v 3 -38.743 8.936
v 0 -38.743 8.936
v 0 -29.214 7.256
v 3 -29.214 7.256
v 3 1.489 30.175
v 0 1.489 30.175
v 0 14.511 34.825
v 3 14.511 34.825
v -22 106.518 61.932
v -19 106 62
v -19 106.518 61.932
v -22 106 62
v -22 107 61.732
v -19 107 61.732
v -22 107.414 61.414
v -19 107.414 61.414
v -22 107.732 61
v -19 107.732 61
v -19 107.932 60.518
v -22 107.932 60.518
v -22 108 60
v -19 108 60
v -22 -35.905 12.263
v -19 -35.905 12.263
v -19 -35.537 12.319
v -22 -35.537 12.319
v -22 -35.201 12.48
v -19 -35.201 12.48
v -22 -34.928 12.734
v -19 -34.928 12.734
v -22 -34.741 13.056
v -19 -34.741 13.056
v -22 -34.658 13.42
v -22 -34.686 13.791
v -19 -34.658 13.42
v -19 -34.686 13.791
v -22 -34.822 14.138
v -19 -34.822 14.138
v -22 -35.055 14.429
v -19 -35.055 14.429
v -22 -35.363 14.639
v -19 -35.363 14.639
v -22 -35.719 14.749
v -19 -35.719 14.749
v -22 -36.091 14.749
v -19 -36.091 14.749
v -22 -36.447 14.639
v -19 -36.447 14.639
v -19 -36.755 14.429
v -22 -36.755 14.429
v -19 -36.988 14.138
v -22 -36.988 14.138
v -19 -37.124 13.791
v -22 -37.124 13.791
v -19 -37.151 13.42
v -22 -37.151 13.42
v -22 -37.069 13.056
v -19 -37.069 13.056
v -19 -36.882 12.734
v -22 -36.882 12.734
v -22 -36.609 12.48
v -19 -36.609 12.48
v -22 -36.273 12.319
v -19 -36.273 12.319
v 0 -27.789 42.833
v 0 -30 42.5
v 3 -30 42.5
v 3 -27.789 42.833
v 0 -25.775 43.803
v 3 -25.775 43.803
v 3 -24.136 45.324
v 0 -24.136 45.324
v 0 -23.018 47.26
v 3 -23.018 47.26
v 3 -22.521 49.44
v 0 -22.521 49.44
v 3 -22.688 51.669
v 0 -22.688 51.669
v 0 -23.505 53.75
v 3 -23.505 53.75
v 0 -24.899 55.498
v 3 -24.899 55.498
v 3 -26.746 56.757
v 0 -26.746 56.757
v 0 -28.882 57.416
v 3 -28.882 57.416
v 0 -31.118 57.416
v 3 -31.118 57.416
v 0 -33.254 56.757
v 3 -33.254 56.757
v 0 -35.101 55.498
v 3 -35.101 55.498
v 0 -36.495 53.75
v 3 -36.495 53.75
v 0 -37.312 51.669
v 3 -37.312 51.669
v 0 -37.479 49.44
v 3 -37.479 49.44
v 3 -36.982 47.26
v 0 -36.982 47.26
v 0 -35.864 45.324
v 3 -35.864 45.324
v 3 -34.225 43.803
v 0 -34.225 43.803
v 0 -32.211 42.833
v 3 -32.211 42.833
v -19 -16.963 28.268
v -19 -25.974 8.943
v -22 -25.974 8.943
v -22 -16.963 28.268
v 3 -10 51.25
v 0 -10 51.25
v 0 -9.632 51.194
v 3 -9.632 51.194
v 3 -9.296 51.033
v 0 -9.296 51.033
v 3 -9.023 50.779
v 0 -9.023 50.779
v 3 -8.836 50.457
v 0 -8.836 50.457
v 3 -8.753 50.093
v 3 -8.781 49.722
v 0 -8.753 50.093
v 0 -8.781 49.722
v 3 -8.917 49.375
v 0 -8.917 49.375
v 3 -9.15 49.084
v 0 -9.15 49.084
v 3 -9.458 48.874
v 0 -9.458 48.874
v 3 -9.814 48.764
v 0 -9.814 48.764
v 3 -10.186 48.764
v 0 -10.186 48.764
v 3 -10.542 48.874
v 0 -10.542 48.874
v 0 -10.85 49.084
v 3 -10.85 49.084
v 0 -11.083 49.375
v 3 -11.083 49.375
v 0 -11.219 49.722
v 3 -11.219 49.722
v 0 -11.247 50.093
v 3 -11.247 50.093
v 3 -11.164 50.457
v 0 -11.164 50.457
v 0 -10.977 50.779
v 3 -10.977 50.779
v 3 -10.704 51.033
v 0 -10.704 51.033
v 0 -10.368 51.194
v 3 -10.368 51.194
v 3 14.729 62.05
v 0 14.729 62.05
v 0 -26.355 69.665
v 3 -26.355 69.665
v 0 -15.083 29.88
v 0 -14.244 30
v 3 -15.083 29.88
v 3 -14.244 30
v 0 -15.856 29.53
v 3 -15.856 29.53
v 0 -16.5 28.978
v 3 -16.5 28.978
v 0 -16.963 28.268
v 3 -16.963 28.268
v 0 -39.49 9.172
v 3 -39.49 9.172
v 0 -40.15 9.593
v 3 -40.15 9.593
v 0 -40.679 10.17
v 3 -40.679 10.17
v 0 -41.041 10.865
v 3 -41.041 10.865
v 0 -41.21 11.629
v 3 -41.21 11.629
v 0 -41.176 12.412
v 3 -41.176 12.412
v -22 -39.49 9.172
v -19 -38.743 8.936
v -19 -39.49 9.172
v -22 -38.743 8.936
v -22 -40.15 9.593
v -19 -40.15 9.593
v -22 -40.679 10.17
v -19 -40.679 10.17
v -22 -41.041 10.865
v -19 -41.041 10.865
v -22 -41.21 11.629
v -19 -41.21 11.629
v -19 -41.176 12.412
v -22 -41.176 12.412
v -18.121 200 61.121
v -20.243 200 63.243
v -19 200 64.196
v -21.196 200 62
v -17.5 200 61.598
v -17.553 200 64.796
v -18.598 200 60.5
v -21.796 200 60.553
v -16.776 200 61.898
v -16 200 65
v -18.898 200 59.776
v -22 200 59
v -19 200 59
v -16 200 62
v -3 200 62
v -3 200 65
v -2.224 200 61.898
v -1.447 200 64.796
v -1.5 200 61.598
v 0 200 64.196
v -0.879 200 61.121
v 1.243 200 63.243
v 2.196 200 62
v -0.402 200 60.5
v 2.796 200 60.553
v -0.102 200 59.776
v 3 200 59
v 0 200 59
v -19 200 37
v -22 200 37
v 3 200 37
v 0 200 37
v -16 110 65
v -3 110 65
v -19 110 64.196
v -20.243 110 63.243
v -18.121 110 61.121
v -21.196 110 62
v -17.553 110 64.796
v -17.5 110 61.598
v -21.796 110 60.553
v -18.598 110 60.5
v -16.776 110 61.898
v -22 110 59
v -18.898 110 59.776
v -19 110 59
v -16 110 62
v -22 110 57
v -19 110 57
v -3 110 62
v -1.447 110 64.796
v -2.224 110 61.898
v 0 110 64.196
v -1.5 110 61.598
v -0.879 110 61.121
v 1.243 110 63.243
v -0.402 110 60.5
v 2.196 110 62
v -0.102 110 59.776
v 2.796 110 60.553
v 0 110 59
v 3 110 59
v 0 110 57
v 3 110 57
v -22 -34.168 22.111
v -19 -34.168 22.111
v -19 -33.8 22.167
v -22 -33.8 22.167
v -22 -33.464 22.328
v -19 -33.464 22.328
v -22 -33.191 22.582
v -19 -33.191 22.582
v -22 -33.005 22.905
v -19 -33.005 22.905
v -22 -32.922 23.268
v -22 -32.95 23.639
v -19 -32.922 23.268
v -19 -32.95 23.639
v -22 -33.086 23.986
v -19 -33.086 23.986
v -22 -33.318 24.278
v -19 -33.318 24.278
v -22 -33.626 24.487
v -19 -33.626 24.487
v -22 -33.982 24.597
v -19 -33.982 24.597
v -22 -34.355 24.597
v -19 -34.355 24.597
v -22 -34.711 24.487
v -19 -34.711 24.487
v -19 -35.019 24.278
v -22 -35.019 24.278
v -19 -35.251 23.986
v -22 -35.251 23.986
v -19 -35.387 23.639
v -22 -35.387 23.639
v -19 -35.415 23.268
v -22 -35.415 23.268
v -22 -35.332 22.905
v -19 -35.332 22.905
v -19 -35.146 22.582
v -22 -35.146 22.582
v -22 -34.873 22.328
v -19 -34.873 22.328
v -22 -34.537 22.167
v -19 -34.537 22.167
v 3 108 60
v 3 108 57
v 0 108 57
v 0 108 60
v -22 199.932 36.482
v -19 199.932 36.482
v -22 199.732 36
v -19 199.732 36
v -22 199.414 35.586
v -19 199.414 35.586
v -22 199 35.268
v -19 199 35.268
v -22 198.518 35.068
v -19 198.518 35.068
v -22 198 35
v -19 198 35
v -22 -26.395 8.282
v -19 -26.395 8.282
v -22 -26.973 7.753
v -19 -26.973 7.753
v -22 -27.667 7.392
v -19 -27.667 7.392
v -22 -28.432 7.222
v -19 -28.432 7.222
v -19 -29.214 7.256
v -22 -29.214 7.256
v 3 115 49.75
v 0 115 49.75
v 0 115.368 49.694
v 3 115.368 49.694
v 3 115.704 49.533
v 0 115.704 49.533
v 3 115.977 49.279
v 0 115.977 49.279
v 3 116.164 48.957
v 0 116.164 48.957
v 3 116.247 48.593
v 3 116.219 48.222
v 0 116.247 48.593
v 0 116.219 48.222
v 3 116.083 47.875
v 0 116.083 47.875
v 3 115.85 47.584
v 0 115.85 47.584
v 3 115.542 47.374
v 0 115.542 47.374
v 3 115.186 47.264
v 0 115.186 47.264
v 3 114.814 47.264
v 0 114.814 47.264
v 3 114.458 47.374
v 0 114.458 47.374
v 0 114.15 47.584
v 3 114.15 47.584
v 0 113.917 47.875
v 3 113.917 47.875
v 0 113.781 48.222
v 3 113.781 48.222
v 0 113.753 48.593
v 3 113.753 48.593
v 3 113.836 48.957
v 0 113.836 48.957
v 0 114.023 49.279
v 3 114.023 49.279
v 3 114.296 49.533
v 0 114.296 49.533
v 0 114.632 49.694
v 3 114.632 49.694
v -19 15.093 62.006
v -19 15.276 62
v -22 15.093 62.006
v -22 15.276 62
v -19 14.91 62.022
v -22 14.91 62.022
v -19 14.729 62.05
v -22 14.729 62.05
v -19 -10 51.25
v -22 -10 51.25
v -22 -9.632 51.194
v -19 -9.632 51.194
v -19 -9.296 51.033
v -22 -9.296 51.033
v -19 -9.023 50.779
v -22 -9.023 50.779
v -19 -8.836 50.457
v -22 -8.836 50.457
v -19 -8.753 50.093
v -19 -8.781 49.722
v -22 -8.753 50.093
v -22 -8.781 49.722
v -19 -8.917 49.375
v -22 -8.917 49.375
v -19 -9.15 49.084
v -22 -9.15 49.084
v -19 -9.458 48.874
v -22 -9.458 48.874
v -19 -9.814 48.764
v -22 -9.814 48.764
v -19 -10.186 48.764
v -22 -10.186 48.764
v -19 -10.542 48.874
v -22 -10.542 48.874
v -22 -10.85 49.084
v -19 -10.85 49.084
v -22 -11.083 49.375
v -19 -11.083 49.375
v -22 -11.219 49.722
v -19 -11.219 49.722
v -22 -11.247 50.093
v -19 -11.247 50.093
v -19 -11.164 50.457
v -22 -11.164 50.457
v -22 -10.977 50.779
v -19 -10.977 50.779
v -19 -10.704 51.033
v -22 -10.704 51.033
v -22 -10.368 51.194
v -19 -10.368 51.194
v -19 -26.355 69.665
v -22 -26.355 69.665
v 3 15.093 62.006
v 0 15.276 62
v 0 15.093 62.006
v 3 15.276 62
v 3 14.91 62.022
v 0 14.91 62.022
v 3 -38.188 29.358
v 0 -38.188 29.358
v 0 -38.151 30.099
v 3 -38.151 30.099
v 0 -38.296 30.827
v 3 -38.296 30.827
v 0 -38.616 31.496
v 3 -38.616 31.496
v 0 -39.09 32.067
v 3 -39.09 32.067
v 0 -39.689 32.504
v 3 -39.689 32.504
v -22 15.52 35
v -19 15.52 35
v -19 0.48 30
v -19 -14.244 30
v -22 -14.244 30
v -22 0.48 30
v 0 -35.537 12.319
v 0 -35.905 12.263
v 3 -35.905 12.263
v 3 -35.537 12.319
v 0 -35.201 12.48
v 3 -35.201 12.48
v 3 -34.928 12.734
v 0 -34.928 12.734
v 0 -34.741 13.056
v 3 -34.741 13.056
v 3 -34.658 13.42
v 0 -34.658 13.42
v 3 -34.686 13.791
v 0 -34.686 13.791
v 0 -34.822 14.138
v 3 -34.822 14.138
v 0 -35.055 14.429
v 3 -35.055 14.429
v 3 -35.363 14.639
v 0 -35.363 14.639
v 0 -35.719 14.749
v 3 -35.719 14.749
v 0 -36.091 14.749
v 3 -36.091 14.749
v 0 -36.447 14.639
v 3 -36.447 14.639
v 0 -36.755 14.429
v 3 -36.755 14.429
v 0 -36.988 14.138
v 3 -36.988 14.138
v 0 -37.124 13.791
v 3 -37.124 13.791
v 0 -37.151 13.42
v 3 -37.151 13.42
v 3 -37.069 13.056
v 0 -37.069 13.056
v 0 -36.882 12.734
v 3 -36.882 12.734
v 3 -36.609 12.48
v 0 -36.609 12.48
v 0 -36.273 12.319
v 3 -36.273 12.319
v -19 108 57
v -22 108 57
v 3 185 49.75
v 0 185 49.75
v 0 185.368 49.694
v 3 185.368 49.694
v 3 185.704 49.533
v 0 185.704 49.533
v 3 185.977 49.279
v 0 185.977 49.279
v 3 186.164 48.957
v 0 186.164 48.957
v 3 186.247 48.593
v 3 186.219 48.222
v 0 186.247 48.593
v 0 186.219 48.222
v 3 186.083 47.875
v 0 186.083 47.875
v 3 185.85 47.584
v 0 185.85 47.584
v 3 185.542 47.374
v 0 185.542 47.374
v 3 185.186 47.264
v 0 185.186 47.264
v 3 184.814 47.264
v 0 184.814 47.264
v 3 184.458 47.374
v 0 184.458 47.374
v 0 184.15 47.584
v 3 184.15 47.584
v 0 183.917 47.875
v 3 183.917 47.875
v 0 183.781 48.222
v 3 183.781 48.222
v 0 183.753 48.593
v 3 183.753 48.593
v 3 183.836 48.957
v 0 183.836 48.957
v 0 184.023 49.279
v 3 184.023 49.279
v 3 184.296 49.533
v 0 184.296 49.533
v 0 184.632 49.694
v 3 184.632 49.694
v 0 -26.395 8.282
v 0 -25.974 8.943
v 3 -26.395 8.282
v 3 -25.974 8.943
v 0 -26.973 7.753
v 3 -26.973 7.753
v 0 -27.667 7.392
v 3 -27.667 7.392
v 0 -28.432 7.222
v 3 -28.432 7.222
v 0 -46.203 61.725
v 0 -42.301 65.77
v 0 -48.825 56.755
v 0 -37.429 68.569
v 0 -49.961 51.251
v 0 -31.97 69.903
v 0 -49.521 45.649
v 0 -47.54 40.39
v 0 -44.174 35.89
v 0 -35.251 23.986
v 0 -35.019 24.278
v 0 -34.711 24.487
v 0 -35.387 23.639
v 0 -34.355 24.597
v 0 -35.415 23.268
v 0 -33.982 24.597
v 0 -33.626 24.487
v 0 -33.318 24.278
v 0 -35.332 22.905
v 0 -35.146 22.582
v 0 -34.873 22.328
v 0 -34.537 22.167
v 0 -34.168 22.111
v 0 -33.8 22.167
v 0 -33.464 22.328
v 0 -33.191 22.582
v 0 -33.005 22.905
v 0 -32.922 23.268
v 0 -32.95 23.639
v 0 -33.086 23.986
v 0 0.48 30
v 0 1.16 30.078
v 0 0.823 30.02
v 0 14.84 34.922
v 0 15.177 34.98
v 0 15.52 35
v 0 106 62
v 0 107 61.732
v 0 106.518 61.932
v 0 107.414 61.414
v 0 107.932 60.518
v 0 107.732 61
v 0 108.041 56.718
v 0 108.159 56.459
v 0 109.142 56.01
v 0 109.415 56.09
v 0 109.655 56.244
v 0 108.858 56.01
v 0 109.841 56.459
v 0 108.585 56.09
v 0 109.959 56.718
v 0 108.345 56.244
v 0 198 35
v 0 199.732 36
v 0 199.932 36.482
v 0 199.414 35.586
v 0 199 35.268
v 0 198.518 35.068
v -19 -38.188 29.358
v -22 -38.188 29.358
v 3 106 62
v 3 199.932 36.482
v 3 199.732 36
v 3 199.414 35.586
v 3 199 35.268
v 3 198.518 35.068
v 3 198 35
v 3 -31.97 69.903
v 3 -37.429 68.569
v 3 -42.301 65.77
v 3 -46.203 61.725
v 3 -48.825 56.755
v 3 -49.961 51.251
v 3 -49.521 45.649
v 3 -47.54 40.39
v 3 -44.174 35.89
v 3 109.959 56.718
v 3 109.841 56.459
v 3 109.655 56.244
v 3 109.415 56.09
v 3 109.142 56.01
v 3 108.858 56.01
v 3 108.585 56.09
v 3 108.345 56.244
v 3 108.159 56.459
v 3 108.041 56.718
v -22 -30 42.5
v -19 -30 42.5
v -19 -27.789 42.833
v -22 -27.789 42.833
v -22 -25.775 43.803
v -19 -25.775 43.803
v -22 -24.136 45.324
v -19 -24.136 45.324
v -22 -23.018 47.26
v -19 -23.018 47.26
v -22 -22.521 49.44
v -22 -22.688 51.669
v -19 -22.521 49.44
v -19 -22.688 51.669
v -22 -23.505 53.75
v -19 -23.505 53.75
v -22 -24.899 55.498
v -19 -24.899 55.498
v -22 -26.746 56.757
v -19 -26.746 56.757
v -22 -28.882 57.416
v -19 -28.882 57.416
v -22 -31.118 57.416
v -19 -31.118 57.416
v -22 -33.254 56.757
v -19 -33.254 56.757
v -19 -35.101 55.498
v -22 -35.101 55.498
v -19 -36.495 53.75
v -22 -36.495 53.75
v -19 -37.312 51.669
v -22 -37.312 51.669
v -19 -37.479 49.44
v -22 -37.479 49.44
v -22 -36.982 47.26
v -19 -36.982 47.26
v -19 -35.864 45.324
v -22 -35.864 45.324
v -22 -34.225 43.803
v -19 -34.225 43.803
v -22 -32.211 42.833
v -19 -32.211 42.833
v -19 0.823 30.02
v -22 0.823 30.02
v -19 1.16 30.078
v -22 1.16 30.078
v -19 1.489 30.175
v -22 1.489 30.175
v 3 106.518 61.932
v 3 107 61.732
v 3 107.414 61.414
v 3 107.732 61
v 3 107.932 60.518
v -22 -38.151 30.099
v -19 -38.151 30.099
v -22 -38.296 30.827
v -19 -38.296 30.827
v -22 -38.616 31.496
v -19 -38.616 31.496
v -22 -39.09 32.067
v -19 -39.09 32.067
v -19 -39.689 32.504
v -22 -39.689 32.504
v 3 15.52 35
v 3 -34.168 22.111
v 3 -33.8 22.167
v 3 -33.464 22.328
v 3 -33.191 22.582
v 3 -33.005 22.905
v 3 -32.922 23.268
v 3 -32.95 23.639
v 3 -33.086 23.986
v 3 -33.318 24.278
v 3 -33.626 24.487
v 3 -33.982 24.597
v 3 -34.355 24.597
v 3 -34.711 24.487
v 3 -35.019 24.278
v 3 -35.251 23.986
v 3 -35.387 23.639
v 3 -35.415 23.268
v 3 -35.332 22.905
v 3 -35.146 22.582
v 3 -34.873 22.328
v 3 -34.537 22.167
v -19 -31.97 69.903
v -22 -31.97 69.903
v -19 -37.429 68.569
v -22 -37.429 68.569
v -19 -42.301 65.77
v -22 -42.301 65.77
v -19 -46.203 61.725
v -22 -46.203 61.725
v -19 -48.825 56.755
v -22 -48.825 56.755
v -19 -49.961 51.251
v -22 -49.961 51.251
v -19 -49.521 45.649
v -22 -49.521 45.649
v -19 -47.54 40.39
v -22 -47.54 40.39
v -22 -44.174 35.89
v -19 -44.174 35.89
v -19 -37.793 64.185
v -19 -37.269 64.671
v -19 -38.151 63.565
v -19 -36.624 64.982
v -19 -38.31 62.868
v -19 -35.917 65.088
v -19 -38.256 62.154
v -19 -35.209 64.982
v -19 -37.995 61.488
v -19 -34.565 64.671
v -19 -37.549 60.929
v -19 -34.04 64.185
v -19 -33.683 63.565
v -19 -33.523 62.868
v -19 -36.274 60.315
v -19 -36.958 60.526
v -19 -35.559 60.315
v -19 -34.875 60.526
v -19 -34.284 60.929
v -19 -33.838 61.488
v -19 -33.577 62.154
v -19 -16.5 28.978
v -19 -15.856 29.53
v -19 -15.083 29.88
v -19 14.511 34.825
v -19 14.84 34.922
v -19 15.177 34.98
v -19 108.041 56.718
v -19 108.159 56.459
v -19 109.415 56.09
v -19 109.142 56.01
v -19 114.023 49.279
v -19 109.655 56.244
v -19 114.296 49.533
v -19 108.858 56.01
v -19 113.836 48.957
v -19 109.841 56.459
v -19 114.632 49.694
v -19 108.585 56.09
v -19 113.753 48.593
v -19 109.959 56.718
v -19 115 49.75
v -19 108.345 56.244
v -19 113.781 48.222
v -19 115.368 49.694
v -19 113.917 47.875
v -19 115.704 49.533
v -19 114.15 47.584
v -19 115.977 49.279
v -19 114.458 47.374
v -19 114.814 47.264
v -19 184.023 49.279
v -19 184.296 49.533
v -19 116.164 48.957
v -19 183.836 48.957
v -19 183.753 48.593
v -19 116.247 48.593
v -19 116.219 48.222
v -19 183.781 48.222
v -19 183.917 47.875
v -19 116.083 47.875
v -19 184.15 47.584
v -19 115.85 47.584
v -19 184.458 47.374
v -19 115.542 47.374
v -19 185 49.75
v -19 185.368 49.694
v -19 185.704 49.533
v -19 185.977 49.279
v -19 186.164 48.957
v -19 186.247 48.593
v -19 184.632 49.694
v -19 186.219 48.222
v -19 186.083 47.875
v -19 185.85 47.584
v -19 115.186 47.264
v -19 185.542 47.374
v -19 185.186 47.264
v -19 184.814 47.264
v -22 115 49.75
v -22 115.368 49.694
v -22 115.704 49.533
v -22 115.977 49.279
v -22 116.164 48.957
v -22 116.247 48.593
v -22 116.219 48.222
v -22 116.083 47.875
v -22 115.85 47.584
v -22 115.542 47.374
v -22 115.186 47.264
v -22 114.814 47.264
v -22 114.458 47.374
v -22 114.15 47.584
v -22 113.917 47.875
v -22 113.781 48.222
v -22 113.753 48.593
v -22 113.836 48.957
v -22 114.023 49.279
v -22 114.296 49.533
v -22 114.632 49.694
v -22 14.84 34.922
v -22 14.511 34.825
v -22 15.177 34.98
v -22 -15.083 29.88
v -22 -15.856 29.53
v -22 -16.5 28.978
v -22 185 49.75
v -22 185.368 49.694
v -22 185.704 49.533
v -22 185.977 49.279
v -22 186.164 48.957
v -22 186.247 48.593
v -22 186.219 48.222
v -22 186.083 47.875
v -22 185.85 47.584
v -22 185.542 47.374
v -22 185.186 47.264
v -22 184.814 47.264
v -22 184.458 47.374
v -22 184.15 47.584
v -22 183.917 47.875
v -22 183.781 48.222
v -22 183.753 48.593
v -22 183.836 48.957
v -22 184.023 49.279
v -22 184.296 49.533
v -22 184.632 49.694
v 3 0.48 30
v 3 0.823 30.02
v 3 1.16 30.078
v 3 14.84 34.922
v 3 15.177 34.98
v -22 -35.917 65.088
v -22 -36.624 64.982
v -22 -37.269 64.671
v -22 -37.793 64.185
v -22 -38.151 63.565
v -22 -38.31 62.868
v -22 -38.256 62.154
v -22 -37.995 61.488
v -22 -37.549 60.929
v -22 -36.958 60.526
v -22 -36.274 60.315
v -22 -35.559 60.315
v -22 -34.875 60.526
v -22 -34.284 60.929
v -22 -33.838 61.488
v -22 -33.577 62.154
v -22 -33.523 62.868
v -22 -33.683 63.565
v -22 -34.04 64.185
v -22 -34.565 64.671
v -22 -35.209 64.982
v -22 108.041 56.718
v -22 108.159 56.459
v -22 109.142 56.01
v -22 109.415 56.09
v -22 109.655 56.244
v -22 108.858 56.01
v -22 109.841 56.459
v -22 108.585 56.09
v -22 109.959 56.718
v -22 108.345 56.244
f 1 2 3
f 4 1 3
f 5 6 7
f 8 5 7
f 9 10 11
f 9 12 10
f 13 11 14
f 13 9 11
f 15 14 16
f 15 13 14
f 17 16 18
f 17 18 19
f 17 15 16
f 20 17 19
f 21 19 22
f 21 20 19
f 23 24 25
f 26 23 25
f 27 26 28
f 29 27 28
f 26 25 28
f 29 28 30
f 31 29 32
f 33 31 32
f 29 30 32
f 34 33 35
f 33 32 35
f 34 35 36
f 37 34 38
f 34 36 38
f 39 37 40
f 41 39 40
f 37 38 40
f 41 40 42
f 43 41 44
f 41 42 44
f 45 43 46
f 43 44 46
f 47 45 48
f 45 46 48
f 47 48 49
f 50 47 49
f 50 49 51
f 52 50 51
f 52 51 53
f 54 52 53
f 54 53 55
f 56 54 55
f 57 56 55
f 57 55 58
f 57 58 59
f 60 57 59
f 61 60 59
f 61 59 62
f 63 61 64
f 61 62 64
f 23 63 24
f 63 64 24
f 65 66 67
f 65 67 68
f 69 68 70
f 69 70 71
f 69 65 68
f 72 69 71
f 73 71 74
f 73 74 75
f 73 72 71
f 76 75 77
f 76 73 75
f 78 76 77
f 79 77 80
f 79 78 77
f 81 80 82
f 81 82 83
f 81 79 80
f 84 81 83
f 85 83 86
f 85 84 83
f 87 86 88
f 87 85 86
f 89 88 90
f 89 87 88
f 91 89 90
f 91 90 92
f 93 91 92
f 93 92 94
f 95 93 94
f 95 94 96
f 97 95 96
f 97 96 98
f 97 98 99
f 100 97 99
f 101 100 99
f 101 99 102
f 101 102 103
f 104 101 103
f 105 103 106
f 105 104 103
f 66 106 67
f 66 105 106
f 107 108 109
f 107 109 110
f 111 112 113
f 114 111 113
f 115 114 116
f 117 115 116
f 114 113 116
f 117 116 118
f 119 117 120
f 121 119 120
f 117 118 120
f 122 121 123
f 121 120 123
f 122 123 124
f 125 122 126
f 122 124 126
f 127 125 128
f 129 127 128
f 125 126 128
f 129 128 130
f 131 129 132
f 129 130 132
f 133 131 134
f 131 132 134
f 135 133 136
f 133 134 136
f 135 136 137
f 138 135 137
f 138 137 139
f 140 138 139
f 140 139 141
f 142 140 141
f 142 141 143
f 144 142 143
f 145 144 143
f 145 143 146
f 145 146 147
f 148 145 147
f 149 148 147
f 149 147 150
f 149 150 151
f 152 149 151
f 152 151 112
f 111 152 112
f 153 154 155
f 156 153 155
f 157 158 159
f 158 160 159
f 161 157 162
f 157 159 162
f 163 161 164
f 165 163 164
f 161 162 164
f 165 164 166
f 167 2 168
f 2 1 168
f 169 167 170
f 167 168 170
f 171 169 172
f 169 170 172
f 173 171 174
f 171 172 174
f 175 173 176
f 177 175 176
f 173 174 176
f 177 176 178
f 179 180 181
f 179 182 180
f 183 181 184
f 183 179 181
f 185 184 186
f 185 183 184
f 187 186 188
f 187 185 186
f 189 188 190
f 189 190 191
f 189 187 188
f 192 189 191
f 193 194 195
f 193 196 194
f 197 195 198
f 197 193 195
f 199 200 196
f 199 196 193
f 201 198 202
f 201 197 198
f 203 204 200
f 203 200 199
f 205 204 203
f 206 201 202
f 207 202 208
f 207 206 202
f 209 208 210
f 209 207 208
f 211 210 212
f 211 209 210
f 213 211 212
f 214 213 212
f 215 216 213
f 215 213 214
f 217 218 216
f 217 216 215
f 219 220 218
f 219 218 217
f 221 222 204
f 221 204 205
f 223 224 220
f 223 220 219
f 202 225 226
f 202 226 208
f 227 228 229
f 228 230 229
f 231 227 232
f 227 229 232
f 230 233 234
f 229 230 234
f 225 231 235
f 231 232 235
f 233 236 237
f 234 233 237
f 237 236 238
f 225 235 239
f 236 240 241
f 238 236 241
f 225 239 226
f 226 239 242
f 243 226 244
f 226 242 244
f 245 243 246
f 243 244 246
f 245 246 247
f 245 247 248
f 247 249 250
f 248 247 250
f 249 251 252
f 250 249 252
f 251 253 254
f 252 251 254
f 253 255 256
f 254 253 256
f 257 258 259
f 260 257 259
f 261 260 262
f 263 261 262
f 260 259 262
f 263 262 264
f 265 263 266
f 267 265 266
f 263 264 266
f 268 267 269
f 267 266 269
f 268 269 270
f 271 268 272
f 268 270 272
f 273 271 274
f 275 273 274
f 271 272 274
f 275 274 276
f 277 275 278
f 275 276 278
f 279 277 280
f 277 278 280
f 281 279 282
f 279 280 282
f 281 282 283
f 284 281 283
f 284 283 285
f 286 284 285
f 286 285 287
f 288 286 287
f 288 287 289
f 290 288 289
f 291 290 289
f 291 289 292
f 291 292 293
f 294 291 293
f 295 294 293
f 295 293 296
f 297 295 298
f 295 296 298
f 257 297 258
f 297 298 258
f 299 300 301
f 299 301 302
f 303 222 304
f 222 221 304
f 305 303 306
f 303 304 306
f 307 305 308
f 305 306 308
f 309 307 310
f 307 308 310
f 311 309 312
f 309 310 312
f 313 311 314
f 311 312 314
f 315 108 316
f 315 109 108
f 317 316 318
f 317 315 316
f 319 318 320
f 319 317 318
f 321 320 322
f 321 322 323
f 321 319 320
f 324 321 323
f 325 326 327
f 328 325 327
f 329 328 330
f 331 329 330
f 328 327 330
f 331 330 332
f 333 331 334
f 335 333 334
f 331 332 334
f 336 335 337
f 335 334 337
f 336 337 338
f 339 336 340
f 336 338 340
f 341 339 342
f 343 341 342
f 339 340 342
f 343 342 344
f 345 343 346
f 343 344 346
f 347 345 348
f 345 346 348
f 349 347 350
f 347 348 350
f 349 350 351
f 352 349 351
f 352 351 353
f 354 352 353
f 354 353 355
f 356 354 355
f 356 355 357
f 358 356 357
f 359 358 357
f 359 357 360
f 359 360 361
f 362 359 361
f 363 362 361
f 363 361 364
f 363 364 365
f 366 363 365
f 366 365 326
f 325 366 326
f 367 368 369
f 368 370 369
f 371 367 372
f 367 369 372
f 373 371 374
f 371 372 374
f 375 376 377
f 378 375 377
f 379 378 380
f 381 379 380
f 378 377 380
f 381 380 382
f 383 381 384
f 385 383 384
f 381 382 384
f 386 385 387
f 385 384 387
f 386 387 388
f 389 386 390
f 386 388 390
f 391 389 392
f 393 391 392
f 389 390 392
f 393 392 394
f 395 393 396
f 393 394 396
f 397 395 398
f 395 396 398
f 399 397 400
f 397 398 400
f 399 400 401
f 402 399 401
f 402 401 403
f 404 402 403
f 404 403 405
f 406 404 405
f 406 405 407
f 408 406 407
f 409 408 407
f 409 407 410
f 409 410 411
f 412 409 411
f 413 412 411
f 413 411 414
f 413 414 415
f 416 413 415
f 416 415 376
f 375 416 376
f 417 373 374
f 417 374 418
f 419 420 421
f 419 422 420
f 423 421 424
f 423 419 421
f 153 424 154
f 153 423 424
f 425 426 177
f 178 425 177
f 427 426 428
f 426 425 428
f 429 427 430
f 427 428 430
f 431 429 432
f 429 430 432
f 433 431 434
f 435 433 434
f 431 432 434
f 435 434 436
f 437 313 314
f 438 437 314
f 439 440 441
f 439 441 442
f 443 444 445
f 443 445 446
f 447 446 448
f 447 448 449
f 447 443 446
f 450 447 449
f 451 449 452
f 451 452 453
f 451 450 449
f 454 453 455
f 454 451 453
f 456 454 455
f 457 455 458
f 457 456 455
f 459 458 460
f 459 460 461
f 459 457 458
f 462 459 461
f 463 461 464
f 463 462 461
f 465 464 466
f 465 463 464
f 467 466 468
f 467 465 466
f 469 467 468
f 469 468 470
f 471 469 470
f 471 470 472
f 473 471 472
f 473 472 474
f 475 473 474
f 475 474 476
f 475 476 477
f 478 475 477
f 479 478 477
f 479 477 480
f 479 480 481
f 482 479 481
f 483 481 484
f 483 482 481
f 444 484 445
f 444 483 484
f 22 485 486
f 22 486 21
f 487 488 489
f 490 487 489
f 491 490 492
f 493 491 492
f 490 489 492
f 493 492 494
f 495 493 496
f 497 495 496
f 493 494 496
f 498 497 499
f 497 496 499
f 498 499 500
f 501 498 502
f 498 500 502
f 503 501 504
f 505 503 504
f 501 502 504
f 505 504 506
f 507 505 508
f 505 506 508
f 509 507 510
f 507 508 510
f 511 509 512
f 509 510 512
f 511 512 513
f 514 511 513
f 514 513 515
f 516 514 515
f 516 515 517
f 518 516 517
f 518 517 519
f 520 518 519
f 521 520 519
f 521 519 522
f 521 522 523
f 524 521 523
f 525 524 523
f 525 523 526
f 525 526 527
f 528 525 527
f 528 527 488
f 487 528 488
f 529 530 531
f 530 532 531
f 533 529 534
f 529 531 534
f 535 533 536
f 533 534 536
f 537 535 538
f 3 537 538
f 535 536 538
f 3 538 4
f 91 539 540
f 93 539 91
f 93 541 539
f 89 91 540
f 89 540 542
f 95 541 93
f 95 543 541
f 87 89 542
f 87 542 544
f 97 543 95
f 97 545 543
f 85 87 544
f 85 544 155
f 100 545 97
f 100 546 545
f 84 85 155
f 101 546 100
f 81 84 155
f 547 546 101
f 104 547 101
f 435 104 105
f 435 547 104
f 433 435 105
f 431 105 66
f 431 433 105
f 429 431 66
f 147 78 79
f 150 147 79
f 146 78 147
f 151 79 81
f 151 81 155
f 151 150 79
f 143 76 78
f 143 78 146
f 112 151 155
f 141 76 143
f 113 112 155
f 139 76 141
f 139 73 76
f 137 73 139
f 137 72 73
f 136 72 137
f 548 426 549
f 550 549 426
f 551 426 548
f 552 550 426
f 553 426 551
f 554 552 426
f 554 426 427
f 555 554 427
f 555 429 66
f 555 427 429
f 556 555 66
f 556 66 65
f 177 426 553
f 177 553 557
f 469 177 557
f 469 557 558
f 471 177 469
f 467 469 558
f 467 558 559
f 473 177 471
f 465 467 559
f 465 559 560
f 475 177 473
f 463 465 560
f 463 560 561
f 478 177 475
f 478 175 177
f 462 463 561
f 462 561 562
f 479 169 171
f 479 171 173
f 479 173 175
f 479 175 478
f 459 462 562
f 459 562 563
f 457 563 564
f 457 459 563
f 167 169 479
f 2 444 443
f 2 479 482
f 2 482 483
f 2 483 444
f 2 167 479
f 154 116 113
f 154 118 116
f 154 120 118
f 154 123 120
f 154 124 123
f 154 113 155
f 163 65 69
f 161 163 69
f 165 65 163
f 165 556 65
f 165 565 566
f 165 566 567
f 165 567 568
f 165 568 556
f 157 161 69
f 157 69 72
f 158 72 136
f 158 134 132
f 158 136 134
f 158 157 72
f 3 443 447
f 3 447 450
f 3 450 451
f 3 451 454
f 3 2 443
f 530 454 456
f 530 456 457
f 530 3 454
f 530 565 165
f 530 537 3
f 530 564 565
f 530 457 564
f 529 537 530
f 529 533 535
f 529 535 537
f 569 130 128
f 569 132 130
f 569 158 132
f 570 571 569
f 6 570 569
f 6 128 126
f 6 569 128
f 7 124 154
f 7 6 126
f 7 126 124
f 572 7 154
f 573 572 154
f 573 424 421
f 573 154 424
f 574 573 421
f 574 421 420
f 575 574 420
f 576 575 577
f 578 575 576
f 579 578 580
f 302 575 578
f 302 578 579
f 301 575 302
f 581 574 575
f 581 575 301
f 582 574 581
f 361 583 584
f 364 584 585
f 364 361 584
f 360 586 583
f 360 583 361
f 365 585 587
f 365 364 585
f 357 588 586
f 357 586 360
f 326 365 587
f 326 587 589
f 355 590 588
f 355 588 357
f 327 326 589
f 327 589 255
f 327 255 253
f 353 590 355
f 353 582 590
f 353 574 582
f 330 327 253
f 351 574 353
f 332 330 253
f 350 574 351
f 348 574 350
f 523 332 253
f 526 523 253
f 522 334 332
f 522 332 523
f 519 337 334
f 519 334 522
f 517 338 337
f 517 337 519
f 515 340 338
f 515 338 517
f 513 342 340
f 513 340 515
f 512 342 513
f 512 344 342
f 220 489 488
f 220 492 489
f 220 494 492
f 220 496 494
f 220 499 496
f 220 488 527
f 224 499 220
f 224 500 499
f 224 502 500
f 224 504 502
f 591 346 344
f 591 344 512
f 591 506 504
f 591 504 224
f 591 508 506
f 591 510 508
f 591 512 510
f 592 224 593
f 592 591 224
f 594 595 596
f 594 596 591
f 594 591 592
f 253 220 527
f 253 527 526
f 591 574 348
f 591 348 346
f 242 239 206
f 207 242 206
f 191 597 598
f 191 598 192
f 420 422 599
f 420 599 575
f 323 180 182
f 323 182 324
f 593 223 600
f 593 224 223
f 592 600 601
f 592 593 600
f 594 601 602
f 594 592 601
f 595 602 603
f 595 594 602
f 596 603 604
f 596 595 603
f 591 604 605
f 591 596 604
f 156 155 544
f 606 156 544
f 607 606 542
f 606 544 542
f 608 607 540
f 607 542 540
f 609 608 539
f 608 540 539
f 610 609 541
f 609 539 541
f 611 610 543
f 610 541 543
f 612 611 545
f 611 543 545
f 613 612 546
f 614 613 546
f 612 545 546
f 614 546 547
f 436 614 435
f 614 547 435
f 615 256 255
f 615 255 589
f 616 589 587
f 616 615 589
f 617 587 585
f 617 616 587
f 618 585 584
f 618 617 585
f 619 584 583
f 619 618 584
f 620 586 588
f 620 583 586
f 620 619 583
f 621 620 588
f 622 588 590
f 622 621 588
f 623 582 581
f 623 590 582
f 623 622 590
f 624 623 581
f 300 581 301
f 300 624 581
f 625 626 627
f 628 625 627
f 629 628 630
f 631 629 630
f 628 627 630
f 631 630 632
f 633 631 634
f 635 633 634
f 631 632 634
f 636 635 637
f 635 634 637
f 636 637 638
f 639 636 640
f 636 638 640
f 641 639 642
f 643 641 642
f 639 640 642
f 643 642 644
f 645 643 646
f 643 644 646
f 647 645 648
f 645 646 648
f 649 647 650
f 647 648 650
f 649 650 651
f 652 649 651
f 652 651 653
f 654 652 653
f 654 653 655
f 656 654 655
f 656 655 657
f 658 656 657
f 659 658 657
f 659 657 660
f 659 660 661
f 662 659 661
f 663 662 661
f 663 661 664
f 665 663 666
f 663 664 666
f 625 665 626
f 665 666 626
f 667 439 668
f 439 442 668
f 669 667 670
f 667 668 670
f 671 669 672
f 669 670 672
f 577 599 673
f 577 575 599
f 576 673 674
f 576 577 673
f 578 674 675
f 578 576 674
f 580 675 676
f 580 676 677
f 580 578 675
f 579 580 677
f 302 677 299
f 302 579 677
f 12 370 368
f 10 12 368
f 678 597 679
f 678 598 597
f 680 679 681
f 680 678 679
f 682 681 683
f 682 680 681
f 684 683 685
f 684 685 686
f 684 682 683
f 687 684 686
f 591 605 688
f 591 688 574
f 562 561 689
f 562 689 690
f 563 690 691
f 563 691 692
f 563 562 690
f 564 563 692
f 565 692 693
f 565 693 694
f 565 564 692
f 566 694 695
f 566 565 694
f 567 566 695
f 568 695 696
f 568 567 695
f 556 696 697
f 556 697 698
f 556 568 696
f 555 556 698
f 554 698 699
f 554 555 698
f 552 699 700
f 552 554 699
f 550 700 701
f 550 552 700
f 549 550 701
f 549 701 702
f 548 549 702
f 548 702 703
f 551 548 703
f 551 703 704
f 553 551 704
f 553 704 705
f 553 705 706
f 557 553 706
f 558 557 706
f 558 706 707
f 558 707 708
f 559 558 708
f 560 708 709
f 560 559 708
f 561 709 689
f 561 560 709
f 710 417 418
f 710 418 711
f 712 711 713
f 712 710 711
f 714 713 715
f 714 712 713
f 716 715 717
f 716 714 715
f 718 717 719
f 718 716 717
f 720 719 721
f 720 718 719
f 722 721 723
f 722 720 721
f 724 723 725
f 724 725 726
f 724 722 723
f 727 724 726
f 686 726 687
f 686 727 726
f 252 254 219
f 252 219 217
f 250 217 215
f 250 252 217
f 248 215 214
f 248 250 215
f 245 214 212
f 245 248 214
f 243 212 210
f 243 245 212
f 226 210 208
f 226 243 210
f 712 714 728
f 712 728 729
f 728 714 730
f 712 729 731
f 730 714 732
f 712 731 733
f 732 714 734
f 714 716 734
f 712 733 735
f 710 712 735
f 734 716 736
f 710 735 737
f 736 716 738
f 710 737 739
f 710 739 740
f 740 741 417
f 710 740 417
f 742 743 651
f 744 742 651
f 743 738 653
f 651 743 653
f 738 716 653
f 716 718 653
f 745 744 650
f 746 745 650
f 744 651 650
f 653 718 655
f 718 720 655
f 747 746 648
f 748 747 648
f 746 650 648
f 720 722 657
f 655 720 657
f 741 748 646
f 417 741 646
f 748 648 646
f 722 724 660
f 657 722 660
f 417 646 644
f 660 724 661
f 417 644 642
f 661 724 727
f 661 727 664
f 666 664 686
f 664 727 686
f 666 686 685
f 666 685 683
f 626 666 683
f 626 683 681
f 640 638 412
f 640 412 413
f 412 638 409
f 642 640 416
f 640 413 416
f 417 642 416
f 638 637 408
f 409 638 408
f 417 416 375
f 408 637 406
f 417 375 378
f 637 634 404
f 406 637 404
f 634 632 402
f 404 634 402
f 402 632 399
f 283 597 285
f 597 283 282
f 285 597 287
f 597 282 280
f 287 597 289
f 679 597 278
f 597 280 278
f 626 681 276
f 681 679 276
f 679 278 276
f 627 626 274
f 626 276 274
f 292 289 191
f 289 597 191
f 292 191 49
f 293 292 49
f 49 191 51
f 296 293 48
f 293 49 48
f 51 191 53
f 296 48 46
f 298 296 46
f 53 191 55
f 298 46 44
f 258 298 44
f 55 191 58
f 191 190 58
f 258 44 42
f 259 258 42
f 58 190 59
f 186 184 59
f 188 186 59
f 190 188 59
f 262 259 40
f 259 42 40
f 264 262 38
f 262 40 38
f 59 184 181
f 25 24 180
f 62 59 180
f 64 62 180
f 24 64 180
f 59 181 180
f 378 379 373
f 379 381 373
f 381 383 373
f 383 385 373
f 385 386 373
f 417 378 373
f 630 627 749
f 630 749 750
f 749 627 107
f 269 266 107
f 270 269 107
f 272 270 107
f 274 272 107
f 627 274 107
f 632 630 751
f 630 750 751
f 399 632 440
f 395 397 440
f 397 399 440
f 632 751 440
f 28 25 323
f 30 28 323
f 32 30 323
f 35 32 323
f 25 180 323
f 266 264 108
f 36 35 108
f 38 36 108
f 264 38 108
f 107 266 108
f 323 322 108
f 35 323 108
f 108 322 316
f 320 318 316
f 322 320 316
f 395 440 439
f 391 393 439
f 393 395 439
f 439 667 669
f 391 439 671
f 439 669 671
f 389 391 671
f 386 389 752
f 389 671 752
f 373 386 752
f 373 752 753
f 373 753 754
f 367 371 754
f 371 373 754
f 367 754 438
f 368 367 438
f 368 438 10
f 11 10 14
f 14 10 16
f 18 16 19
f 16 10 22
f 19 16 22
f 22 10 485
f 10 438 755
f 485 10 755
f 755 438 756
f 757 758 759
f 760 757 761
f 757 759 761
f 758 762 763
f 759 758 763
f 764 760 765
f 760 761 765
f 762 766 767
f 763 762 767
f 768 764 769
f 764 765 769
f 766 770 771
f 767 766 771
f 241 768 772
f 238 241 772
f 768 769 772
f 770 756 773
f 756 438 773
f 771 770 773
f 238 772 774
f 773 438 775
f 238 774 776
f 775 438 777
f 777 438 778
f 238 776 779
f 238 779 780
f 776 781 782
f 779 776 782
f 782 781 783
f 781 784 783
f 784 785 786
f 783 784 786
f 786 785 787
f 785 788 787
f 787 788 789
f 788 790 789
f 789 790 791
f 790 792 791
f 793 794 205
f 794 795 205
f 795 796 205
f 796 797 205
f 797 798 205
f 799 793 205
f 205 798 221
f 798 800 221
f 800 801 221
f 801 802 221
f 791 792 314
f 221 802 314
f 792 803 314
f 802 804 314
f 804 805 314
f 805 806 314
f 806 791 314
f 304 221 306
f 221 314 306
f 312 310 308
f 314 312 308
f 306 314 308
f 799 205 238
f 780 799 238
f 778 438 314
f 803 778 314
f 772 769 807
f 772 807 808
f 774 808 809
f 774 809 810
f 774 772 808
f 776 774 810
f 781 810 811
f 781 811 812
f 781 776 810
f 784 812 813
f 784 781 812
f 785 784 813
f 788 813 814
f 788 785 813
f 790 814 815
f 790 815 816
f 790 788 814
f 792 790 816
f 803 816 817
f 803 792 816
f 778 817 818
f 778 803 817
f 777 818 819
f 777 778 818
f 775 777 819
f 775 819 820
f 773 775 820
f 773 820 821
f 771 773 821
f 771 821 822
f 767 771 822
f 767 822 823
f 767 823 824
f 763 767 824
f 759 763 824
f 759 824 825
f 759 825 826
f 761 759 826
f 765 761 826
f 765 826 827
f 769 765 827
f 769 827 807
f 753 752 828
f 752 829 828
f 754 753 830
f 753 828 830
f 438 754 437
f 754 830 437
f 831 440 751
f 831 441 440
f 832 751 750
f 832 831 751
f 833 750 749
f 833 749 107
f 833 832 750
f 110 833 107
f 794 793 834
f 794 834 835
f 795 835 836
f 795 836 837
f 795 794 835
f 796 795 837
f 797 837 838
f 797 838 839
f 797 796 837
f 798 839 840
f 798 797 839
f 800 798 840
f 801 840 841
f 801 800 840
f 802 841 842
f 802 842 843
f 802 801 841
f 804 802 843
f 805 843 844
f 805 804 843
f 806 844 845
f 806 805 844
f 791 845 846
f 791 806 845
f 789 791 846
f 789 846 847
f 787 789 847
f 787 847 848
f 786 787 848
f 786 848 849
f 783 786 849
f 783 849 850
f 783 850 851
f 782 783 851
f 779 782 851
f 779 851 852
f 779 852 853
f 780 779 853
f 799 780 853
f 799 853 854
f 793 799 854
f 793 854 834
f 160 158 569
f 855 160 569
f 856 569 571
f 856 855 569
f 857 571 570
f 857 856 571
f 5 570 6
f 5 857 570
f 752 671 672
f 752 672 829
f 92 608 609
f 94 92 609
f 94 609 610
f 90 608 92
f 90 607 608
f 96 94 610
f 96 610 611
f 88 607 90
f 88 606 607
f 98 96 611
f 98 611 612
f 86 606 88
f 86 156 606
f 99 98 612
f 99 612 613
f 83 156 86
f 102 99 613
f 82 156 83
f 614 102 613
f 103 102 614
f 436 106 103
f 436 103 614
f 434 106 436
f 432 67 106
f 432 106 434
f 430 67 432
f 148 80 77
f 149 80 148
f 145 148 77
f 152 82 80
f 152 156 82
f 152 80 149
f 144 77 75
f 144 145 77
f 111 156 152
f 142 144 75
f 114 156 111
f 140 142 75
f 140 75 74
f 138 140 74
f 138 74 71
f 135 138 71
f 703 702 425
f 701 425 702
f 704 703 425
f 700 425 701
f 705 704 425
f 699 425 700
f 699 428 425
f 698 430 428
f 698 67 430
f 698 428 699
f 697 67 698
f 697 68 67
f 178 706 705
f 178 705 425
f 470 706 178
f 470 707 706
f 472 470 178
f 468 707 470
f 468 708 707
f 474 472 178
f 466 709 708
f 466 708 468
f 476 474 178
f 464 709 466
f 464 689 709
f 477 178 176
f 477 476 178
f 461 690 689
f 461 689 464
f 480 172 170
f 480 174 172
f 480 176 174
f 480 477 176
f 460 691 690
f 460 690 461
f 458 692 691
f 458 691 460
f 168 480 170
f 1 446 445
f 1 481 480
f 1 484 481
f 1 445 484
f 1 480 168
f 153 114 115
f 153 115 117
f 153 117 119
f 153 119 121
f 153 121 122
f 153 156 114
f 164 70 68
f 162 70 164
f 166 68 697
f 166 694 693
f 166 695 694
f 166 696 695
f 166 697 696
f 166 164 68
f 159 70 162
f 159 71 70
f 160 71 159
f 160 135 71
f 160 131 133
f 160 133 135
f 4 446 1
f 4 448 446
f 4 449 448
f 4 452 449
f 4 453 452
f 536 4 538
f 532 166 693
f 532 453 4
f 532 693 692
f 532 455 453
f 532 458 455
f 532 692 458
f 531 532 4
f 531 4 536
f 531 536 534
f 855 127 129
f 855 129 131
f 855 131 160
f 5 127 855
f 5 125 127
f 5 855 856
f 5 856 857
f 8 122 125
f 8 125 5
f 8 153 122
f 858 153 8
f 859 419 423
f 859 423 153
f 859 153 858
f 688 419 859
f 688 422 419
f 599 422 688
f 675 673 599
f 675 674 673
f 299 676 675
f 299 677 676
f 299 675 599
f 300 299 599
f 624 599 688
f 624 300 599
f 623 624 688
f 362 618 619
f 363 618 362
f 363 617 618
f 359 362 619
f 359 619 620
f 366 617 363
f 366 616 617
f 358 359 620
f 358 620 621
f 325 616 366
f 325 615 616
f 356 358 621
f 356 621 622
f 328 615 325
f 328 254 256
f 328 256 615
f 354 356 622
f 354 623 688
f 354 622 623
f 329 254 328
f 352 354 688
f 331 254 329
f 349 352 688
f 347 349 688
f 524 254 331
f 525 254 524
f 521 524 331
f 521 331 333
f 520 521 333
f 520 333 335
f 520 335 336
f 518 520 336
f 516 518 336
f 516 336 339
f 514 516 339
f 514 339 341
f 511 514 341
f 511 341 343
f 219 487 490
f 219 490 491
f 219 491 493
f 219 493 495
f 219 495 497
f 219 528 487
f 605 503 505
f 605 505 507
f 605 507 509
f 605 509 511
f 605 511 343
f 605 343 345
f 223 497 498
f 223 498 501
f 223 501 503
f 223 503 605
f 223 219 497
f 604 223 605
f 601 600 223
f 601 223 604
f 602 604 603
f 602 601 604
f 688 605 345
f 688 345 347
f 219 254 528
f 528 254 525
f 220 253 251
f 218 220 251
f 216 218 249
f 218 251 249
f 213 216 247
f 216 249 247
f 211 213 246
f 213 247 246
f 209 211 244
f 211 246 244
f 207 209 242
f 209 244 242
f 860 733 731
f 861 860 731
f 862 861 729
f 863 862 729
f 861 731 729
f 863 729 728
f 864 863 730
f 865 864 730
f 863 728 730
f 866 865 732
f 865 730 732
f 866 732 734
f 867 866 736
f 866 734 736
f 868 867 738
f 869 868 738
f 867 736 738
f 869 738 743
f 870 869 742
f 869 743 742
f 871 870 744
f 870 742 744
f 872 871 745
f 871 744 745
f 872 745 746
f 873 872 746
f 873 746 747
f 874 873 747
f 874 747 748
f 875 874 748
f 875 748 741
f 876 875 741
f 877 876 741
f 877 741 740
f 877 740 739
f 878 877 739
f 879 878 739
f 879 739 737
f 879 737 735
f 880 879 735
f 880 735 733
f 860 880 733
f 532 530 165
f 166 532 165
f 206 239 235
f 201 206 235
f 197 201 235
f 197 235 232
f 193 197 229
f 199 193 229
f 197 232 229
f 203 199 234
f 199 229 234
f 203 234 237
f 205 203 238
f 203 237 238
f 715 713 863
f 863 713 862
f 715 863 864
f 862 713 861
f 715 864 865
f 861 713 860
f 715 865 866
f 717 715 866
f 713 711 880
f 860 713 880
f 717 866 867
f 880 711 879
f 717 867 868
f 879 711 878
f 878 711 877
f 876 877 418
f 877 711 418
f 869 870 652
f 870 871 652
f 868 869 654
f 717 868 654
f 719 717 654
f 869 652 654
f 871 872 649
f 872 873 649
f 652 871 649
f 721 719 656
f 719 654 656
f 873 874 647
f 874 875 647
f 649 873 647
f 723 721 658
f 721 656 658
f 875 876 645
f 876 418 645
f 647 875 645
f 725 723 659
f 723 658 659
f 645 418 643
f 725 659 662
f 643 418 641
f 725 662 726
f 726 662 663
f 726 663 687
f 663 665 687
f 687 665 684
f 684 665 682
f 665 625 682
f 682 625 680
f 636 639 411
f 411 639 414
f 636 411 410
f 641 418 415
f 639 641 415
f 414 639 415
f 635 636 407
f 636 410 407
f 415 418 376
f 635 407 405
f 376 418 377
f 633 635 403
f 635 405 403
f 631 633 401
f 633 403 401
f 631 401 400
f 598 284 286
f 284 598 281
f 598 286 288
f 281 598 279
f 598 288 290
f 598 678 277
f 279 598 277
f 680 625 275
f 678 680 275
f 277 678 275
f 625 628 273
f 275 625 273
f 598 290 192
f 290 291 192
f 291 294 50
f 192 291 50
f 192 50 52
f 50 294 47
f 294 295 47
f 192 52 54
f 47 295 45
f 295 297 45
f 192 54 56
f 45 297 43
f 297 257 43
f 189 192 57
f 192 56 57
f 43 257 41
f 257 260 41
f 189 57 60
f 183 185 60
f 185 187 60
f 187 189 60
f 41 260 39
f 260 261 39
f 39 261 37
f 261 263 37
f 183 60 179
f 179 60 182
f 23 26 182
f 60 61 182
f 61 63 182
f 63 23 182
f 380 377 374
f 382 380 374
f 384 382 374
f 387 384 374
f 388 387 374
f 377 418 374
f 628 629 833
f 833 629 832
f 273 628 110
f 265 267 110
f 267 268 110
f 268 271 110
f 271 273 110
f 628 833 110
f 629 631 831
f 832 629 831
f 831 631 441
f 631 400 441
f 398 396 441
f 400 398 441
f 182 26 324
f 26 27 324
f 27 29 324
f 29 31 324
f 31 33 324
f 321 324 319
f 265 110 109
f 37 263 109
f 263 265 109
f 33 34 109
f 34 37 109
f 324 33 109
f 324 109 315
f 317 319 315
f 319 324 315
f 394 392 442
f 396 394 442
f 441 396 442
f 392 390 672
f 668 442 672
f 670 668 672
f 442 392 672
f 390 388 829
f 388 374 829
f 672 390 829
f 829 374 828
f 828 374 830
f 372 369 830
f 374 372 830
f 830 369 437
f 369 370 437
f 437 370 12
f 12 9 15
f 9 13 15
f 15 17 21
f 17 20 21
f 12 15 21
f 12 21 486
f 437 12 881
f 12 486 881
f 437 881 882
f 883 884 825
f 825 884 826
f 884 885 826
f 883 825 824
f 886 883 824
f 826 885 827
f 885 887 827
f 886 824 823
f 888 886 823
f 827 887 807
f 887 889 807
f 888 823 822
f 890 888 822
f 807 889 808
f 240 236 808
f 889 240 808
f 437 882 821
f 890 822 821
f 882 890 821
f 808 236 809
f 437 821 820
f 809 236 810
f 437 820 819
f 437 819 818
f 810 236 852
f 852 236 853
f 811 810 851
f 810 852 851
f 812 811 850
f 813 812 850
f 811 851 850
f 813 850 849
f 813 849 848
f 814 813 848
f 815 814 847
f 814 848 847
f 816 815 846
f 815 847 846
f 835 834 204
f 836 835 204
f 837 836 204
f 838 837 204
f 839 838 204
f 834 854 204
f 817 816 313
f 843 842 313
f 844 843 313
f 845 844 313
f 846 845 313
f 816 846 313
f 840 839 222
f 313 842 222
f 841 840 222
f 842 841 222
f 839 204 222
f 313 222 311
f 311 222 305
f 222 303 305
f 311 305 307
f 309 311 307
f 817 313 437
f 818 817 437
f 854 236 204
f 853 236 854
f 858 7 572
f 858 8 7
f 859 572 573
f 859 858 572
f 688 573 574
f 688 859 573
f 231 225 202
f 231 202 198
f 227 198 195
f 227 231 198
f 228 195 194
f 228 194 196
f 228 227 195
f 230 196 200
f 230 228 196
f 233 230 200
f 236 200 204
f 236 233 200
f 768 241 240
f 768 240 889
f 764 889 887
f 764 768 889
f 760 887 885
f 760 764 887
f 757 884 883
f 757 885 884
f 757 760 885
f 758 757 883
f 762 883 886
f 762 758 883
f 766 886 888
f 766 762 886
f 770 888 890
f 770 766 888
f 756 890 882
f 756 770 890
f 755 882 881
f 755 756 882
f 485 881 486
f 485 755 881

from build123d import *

# Parameters (mm, degrees)
SKETCH1_R              = 7.5
SKETCH1_R_2            = 1.25
BOSS_EXTRUDE1_DEPTH    = 3
FILLET1_R              = 3
SKETCH4_W              = 3
SKETCH4_H              = 175
BOSS_EXTRUDE3_DEPTH    = 27
SKETCH5_R              = 1.25
CUT_EXTRUDE2_DEPTH     = 212.917436753
FILLET4_R              = 2
SKETCH12_W             = 3
SKETCH12_H             = 90
BOSS_EXTRUDE5_DEPTH    = 12.5
CUT_EXTRUDE1_START     = -22
SKETCH2_R              = 2.4
CUT_EXTRUDE1_DEPTH     = 192.365882934
CUT_EXTRUDE8_DEPTH     = 214.365882934
FILLET5_R              = 2
SKETCH51_R             = 1.25
CUT_EXTRUDE9_DEPTH     = 214.365882934
CONVERT_SOLID9_START   = 110
CONVERT_SOLID9_DEPTH   = 90
CONVERT_SOLID9_2_DEPTH = 90


# Read off the part's stored shape, not the designer's step: Convert-Solid9
with BuildPart() as part:
    # Sketch1 → Boss-Extrude1 (new body)
    with BuildSketch(Plane(origin=(0, 0, 0), x_dir=(0, 0, -1), z_dir=(1, 0, 0))):
        with BuildLine():
            Line((-30, -16.155216865), (-30, 1))
            Line((-30, 1), (-35, 15))
            Line((-35, 15), (-35, 25))
            Line((-35, 25), (-62, 25))
            Line((-62, 25), (-62, 15))
            Line((-62, 15), (-69.665068474, -26.355129371))
            ThreePointArc((-69.665068474, -26.355129371), (-55.754353698, -49.154305352), (-31.582037919, -37.796067776))
            Line((-31.582037919, -37.796067776), (-9.457329759, -41.697250765))
            Line((-9.457329759, -41.697250765), (-6.856499335, -26.947208462))
            Line((-6.856499335, -26.947208462), (-30, -16.155216865))
        make_face()
        with Locations((-50, -30)):
            Circle(SKETCH1_R, mode=Mode.SUBTRACT)
        with Locations((-23.361205166, -34.168489335)):
            Circle(SKETCH1_R_2, mode=Mode.SUBTRACT)
        with Locations((-13.513127636, -35.904971111)):
            Circle(SKETCH1_R_2, mode=Mode.SUBTRACT)
    extrude(amount=BOSS_EXTRUDE1_DEPTH)

    # Fillet1
    fillet1_edges = [part.edges().sort_by_distance(p)[0] for p in [
        (1.5, 15, 35),
        (1.5, 1, 30),
        (1.5, -16.155216865, 30),
        (1.5, -26.947208462, 6.856499335),
        (1.5, -41.697250765, 9.457329759),
        (1.5, -37.796067776, 31.582037919),
        (1.5, 15, 62),
    ]]
    fillet(fillet1_edges, radius=FILLET1_R)

    # Sketch4 → Boss-Extrude3 (add)
    with BuildSketch(Plane(origin=(0, 0, 35), x_dir=(-1, 0, 0), z_dir=(0, 0, -1))):
        with Locations((-1.5, 112.5)):
            Rectangle(SKETCH4_W, SKETCH4_H)
    extrude(amount=-BOSS_EXTRUDE3_DEPTH)

    # Sketch5 → Cut-Extrude2 (cut, through all)
    with BuildSketch(Plane.ZY):
        with Locations((48.5, 185)):
            Circle(SKETCH5_R)
        with Locations((48.5, 115)):
            Circle(SKETCH5_R)
    extrude(amount=-CUT_EXTRUDE2_DEPTH, mode=Mode.SUBTRACT)

    # Fillet4
    fillet4_edges = [part.edges().sort_by_distance(p)[0] for p in [
        (1.5, 200, 35),
    ]]
    fillet(fillet4_edges, radius=FILLET4_R)

    # Sketch12 → Boss-Extrude5 (add)
    with BuildSketch(Plane(origin=(3, 0, 0), x_dir=(0, 0, -1), z_dir=(1, 0, 0))):
        with Locations((-63.5, 155)):
            Rectangle(SKETCH12_W, SKETCH12_H)
    extrude(amount=-BOSS_EXTRUDE5_DEPTH)

    # Mirror2: part across plane


with BuildPart() as part_1:
    add(part.part)
    add(part.part.mirror(Plane.ZY.offset(9.5)))

    # Sketch2 → Cut-Extrude1 (cut, through all)
    with BuildSketch(Plane(origin=(3, 0, 0), x_dir=(0, 0, -1), z_dir=(1, 0, 0)).offset(CUT_EXTRUDE1_START)):
        with Locations(Location((-62.688309019, -35.916655664, 0), (0, 0, 180))):
            Circle(SKETCH2_R)
    extrude(amount=-CUT_EXTRUDE1_DEPTH, mode=Mode.SUBTRACT)

    # Sketch50 → Cut-Extrude8 (cut, through all)
    with BuildSketch(Plane(origin=(3, 0, 0), x_dir=(0, 0, -1), z_dir=(1, 0, 0))):
        with BuildLine():
            Line((-62, 110), (-57, 110))
            ThreePointArc((-57, 110), (-56, 109), (-57, 108))
            Line((-57, 108), (-62, 108))
            Line((-62, 108), (-62, 110))
        make_face()
    extrude(amount=-CUT_EXTRUDE8_DEPTH, mode=Mode.SUBTRACT)

    # Fillet5
    fillet5_edges = [part_1.edges().sort_by_distance(p)[0] for p in [
        (1.5, 108, 62),
        (-20.5, 108, 62),
    ]]
    fillet(fillet5_edges, radius=FILLET5_R)

    # Sketch51 → Cut-Extrude9 (cut, through all)
    with BuildSketch(Plane.ZY.offset(22)):
        with Locations((50, -10)):
            Circle(SKETCH51_R)
    extrude(amount=-CUT_EXTRUDE9_DEPTH, mode=Mode.SUBTRACT)

    # Convert-Solid9 outline → Convert-Solid9 (cut)
    with BuildSketch(Plane(origin=(0, 0, 0), x_dir=(1, 0, 0), z_dir=(0, 1, 0)).offset(CONVERT_SOLID9_START)):
        with BuildLine():
            Line((-3, -65), (3, -65))
            Line((3, -65), (3, -59))
            ThreePointArc((3, -59), (1.242640687, -63.242640687), (-3, -65))
        make_face()
        with BuildLine():
            Line((-22, -65), (-16, -65))
            ThreePointArc((-16, -65), (-20.242640687, -63.242640687), (-22, -59))
            Line((-22, -59), (-22, -65))
        make_face()
    extrude(amount=CONVERT_SOLID9_DEPTH, mode=Mode.SUBTRACT)

    # Convert-Solid9 2 outline → Convert-Solid9 2 (add)
    with BuildSketch(Plane(origin=(0, 0, 0), x_dir=(1, 0, 0), z_dir=(0, 1, 0)).offset(CONVERT_SOLID9_START)):
        with BuildLine():
            Line((0, -62), (0, -59))
            ThreePointArc((0, -59), (-0.878679656, -61.121320344), (-3, -62))
            Line((-3, -62), (0, -62))
        make_face()
        with BuildLine():
            Line((-19, -62), (-16, -62))
            ThreePointArc((-16, -62), (-18.121320344, -61.121320344), (-19, -59))
            Line((-19, -59), (-19, -62))
        make_face()
    extrude(amount=CONVERT_SOLID9_2_DEPTH)


solid = part_1.part
